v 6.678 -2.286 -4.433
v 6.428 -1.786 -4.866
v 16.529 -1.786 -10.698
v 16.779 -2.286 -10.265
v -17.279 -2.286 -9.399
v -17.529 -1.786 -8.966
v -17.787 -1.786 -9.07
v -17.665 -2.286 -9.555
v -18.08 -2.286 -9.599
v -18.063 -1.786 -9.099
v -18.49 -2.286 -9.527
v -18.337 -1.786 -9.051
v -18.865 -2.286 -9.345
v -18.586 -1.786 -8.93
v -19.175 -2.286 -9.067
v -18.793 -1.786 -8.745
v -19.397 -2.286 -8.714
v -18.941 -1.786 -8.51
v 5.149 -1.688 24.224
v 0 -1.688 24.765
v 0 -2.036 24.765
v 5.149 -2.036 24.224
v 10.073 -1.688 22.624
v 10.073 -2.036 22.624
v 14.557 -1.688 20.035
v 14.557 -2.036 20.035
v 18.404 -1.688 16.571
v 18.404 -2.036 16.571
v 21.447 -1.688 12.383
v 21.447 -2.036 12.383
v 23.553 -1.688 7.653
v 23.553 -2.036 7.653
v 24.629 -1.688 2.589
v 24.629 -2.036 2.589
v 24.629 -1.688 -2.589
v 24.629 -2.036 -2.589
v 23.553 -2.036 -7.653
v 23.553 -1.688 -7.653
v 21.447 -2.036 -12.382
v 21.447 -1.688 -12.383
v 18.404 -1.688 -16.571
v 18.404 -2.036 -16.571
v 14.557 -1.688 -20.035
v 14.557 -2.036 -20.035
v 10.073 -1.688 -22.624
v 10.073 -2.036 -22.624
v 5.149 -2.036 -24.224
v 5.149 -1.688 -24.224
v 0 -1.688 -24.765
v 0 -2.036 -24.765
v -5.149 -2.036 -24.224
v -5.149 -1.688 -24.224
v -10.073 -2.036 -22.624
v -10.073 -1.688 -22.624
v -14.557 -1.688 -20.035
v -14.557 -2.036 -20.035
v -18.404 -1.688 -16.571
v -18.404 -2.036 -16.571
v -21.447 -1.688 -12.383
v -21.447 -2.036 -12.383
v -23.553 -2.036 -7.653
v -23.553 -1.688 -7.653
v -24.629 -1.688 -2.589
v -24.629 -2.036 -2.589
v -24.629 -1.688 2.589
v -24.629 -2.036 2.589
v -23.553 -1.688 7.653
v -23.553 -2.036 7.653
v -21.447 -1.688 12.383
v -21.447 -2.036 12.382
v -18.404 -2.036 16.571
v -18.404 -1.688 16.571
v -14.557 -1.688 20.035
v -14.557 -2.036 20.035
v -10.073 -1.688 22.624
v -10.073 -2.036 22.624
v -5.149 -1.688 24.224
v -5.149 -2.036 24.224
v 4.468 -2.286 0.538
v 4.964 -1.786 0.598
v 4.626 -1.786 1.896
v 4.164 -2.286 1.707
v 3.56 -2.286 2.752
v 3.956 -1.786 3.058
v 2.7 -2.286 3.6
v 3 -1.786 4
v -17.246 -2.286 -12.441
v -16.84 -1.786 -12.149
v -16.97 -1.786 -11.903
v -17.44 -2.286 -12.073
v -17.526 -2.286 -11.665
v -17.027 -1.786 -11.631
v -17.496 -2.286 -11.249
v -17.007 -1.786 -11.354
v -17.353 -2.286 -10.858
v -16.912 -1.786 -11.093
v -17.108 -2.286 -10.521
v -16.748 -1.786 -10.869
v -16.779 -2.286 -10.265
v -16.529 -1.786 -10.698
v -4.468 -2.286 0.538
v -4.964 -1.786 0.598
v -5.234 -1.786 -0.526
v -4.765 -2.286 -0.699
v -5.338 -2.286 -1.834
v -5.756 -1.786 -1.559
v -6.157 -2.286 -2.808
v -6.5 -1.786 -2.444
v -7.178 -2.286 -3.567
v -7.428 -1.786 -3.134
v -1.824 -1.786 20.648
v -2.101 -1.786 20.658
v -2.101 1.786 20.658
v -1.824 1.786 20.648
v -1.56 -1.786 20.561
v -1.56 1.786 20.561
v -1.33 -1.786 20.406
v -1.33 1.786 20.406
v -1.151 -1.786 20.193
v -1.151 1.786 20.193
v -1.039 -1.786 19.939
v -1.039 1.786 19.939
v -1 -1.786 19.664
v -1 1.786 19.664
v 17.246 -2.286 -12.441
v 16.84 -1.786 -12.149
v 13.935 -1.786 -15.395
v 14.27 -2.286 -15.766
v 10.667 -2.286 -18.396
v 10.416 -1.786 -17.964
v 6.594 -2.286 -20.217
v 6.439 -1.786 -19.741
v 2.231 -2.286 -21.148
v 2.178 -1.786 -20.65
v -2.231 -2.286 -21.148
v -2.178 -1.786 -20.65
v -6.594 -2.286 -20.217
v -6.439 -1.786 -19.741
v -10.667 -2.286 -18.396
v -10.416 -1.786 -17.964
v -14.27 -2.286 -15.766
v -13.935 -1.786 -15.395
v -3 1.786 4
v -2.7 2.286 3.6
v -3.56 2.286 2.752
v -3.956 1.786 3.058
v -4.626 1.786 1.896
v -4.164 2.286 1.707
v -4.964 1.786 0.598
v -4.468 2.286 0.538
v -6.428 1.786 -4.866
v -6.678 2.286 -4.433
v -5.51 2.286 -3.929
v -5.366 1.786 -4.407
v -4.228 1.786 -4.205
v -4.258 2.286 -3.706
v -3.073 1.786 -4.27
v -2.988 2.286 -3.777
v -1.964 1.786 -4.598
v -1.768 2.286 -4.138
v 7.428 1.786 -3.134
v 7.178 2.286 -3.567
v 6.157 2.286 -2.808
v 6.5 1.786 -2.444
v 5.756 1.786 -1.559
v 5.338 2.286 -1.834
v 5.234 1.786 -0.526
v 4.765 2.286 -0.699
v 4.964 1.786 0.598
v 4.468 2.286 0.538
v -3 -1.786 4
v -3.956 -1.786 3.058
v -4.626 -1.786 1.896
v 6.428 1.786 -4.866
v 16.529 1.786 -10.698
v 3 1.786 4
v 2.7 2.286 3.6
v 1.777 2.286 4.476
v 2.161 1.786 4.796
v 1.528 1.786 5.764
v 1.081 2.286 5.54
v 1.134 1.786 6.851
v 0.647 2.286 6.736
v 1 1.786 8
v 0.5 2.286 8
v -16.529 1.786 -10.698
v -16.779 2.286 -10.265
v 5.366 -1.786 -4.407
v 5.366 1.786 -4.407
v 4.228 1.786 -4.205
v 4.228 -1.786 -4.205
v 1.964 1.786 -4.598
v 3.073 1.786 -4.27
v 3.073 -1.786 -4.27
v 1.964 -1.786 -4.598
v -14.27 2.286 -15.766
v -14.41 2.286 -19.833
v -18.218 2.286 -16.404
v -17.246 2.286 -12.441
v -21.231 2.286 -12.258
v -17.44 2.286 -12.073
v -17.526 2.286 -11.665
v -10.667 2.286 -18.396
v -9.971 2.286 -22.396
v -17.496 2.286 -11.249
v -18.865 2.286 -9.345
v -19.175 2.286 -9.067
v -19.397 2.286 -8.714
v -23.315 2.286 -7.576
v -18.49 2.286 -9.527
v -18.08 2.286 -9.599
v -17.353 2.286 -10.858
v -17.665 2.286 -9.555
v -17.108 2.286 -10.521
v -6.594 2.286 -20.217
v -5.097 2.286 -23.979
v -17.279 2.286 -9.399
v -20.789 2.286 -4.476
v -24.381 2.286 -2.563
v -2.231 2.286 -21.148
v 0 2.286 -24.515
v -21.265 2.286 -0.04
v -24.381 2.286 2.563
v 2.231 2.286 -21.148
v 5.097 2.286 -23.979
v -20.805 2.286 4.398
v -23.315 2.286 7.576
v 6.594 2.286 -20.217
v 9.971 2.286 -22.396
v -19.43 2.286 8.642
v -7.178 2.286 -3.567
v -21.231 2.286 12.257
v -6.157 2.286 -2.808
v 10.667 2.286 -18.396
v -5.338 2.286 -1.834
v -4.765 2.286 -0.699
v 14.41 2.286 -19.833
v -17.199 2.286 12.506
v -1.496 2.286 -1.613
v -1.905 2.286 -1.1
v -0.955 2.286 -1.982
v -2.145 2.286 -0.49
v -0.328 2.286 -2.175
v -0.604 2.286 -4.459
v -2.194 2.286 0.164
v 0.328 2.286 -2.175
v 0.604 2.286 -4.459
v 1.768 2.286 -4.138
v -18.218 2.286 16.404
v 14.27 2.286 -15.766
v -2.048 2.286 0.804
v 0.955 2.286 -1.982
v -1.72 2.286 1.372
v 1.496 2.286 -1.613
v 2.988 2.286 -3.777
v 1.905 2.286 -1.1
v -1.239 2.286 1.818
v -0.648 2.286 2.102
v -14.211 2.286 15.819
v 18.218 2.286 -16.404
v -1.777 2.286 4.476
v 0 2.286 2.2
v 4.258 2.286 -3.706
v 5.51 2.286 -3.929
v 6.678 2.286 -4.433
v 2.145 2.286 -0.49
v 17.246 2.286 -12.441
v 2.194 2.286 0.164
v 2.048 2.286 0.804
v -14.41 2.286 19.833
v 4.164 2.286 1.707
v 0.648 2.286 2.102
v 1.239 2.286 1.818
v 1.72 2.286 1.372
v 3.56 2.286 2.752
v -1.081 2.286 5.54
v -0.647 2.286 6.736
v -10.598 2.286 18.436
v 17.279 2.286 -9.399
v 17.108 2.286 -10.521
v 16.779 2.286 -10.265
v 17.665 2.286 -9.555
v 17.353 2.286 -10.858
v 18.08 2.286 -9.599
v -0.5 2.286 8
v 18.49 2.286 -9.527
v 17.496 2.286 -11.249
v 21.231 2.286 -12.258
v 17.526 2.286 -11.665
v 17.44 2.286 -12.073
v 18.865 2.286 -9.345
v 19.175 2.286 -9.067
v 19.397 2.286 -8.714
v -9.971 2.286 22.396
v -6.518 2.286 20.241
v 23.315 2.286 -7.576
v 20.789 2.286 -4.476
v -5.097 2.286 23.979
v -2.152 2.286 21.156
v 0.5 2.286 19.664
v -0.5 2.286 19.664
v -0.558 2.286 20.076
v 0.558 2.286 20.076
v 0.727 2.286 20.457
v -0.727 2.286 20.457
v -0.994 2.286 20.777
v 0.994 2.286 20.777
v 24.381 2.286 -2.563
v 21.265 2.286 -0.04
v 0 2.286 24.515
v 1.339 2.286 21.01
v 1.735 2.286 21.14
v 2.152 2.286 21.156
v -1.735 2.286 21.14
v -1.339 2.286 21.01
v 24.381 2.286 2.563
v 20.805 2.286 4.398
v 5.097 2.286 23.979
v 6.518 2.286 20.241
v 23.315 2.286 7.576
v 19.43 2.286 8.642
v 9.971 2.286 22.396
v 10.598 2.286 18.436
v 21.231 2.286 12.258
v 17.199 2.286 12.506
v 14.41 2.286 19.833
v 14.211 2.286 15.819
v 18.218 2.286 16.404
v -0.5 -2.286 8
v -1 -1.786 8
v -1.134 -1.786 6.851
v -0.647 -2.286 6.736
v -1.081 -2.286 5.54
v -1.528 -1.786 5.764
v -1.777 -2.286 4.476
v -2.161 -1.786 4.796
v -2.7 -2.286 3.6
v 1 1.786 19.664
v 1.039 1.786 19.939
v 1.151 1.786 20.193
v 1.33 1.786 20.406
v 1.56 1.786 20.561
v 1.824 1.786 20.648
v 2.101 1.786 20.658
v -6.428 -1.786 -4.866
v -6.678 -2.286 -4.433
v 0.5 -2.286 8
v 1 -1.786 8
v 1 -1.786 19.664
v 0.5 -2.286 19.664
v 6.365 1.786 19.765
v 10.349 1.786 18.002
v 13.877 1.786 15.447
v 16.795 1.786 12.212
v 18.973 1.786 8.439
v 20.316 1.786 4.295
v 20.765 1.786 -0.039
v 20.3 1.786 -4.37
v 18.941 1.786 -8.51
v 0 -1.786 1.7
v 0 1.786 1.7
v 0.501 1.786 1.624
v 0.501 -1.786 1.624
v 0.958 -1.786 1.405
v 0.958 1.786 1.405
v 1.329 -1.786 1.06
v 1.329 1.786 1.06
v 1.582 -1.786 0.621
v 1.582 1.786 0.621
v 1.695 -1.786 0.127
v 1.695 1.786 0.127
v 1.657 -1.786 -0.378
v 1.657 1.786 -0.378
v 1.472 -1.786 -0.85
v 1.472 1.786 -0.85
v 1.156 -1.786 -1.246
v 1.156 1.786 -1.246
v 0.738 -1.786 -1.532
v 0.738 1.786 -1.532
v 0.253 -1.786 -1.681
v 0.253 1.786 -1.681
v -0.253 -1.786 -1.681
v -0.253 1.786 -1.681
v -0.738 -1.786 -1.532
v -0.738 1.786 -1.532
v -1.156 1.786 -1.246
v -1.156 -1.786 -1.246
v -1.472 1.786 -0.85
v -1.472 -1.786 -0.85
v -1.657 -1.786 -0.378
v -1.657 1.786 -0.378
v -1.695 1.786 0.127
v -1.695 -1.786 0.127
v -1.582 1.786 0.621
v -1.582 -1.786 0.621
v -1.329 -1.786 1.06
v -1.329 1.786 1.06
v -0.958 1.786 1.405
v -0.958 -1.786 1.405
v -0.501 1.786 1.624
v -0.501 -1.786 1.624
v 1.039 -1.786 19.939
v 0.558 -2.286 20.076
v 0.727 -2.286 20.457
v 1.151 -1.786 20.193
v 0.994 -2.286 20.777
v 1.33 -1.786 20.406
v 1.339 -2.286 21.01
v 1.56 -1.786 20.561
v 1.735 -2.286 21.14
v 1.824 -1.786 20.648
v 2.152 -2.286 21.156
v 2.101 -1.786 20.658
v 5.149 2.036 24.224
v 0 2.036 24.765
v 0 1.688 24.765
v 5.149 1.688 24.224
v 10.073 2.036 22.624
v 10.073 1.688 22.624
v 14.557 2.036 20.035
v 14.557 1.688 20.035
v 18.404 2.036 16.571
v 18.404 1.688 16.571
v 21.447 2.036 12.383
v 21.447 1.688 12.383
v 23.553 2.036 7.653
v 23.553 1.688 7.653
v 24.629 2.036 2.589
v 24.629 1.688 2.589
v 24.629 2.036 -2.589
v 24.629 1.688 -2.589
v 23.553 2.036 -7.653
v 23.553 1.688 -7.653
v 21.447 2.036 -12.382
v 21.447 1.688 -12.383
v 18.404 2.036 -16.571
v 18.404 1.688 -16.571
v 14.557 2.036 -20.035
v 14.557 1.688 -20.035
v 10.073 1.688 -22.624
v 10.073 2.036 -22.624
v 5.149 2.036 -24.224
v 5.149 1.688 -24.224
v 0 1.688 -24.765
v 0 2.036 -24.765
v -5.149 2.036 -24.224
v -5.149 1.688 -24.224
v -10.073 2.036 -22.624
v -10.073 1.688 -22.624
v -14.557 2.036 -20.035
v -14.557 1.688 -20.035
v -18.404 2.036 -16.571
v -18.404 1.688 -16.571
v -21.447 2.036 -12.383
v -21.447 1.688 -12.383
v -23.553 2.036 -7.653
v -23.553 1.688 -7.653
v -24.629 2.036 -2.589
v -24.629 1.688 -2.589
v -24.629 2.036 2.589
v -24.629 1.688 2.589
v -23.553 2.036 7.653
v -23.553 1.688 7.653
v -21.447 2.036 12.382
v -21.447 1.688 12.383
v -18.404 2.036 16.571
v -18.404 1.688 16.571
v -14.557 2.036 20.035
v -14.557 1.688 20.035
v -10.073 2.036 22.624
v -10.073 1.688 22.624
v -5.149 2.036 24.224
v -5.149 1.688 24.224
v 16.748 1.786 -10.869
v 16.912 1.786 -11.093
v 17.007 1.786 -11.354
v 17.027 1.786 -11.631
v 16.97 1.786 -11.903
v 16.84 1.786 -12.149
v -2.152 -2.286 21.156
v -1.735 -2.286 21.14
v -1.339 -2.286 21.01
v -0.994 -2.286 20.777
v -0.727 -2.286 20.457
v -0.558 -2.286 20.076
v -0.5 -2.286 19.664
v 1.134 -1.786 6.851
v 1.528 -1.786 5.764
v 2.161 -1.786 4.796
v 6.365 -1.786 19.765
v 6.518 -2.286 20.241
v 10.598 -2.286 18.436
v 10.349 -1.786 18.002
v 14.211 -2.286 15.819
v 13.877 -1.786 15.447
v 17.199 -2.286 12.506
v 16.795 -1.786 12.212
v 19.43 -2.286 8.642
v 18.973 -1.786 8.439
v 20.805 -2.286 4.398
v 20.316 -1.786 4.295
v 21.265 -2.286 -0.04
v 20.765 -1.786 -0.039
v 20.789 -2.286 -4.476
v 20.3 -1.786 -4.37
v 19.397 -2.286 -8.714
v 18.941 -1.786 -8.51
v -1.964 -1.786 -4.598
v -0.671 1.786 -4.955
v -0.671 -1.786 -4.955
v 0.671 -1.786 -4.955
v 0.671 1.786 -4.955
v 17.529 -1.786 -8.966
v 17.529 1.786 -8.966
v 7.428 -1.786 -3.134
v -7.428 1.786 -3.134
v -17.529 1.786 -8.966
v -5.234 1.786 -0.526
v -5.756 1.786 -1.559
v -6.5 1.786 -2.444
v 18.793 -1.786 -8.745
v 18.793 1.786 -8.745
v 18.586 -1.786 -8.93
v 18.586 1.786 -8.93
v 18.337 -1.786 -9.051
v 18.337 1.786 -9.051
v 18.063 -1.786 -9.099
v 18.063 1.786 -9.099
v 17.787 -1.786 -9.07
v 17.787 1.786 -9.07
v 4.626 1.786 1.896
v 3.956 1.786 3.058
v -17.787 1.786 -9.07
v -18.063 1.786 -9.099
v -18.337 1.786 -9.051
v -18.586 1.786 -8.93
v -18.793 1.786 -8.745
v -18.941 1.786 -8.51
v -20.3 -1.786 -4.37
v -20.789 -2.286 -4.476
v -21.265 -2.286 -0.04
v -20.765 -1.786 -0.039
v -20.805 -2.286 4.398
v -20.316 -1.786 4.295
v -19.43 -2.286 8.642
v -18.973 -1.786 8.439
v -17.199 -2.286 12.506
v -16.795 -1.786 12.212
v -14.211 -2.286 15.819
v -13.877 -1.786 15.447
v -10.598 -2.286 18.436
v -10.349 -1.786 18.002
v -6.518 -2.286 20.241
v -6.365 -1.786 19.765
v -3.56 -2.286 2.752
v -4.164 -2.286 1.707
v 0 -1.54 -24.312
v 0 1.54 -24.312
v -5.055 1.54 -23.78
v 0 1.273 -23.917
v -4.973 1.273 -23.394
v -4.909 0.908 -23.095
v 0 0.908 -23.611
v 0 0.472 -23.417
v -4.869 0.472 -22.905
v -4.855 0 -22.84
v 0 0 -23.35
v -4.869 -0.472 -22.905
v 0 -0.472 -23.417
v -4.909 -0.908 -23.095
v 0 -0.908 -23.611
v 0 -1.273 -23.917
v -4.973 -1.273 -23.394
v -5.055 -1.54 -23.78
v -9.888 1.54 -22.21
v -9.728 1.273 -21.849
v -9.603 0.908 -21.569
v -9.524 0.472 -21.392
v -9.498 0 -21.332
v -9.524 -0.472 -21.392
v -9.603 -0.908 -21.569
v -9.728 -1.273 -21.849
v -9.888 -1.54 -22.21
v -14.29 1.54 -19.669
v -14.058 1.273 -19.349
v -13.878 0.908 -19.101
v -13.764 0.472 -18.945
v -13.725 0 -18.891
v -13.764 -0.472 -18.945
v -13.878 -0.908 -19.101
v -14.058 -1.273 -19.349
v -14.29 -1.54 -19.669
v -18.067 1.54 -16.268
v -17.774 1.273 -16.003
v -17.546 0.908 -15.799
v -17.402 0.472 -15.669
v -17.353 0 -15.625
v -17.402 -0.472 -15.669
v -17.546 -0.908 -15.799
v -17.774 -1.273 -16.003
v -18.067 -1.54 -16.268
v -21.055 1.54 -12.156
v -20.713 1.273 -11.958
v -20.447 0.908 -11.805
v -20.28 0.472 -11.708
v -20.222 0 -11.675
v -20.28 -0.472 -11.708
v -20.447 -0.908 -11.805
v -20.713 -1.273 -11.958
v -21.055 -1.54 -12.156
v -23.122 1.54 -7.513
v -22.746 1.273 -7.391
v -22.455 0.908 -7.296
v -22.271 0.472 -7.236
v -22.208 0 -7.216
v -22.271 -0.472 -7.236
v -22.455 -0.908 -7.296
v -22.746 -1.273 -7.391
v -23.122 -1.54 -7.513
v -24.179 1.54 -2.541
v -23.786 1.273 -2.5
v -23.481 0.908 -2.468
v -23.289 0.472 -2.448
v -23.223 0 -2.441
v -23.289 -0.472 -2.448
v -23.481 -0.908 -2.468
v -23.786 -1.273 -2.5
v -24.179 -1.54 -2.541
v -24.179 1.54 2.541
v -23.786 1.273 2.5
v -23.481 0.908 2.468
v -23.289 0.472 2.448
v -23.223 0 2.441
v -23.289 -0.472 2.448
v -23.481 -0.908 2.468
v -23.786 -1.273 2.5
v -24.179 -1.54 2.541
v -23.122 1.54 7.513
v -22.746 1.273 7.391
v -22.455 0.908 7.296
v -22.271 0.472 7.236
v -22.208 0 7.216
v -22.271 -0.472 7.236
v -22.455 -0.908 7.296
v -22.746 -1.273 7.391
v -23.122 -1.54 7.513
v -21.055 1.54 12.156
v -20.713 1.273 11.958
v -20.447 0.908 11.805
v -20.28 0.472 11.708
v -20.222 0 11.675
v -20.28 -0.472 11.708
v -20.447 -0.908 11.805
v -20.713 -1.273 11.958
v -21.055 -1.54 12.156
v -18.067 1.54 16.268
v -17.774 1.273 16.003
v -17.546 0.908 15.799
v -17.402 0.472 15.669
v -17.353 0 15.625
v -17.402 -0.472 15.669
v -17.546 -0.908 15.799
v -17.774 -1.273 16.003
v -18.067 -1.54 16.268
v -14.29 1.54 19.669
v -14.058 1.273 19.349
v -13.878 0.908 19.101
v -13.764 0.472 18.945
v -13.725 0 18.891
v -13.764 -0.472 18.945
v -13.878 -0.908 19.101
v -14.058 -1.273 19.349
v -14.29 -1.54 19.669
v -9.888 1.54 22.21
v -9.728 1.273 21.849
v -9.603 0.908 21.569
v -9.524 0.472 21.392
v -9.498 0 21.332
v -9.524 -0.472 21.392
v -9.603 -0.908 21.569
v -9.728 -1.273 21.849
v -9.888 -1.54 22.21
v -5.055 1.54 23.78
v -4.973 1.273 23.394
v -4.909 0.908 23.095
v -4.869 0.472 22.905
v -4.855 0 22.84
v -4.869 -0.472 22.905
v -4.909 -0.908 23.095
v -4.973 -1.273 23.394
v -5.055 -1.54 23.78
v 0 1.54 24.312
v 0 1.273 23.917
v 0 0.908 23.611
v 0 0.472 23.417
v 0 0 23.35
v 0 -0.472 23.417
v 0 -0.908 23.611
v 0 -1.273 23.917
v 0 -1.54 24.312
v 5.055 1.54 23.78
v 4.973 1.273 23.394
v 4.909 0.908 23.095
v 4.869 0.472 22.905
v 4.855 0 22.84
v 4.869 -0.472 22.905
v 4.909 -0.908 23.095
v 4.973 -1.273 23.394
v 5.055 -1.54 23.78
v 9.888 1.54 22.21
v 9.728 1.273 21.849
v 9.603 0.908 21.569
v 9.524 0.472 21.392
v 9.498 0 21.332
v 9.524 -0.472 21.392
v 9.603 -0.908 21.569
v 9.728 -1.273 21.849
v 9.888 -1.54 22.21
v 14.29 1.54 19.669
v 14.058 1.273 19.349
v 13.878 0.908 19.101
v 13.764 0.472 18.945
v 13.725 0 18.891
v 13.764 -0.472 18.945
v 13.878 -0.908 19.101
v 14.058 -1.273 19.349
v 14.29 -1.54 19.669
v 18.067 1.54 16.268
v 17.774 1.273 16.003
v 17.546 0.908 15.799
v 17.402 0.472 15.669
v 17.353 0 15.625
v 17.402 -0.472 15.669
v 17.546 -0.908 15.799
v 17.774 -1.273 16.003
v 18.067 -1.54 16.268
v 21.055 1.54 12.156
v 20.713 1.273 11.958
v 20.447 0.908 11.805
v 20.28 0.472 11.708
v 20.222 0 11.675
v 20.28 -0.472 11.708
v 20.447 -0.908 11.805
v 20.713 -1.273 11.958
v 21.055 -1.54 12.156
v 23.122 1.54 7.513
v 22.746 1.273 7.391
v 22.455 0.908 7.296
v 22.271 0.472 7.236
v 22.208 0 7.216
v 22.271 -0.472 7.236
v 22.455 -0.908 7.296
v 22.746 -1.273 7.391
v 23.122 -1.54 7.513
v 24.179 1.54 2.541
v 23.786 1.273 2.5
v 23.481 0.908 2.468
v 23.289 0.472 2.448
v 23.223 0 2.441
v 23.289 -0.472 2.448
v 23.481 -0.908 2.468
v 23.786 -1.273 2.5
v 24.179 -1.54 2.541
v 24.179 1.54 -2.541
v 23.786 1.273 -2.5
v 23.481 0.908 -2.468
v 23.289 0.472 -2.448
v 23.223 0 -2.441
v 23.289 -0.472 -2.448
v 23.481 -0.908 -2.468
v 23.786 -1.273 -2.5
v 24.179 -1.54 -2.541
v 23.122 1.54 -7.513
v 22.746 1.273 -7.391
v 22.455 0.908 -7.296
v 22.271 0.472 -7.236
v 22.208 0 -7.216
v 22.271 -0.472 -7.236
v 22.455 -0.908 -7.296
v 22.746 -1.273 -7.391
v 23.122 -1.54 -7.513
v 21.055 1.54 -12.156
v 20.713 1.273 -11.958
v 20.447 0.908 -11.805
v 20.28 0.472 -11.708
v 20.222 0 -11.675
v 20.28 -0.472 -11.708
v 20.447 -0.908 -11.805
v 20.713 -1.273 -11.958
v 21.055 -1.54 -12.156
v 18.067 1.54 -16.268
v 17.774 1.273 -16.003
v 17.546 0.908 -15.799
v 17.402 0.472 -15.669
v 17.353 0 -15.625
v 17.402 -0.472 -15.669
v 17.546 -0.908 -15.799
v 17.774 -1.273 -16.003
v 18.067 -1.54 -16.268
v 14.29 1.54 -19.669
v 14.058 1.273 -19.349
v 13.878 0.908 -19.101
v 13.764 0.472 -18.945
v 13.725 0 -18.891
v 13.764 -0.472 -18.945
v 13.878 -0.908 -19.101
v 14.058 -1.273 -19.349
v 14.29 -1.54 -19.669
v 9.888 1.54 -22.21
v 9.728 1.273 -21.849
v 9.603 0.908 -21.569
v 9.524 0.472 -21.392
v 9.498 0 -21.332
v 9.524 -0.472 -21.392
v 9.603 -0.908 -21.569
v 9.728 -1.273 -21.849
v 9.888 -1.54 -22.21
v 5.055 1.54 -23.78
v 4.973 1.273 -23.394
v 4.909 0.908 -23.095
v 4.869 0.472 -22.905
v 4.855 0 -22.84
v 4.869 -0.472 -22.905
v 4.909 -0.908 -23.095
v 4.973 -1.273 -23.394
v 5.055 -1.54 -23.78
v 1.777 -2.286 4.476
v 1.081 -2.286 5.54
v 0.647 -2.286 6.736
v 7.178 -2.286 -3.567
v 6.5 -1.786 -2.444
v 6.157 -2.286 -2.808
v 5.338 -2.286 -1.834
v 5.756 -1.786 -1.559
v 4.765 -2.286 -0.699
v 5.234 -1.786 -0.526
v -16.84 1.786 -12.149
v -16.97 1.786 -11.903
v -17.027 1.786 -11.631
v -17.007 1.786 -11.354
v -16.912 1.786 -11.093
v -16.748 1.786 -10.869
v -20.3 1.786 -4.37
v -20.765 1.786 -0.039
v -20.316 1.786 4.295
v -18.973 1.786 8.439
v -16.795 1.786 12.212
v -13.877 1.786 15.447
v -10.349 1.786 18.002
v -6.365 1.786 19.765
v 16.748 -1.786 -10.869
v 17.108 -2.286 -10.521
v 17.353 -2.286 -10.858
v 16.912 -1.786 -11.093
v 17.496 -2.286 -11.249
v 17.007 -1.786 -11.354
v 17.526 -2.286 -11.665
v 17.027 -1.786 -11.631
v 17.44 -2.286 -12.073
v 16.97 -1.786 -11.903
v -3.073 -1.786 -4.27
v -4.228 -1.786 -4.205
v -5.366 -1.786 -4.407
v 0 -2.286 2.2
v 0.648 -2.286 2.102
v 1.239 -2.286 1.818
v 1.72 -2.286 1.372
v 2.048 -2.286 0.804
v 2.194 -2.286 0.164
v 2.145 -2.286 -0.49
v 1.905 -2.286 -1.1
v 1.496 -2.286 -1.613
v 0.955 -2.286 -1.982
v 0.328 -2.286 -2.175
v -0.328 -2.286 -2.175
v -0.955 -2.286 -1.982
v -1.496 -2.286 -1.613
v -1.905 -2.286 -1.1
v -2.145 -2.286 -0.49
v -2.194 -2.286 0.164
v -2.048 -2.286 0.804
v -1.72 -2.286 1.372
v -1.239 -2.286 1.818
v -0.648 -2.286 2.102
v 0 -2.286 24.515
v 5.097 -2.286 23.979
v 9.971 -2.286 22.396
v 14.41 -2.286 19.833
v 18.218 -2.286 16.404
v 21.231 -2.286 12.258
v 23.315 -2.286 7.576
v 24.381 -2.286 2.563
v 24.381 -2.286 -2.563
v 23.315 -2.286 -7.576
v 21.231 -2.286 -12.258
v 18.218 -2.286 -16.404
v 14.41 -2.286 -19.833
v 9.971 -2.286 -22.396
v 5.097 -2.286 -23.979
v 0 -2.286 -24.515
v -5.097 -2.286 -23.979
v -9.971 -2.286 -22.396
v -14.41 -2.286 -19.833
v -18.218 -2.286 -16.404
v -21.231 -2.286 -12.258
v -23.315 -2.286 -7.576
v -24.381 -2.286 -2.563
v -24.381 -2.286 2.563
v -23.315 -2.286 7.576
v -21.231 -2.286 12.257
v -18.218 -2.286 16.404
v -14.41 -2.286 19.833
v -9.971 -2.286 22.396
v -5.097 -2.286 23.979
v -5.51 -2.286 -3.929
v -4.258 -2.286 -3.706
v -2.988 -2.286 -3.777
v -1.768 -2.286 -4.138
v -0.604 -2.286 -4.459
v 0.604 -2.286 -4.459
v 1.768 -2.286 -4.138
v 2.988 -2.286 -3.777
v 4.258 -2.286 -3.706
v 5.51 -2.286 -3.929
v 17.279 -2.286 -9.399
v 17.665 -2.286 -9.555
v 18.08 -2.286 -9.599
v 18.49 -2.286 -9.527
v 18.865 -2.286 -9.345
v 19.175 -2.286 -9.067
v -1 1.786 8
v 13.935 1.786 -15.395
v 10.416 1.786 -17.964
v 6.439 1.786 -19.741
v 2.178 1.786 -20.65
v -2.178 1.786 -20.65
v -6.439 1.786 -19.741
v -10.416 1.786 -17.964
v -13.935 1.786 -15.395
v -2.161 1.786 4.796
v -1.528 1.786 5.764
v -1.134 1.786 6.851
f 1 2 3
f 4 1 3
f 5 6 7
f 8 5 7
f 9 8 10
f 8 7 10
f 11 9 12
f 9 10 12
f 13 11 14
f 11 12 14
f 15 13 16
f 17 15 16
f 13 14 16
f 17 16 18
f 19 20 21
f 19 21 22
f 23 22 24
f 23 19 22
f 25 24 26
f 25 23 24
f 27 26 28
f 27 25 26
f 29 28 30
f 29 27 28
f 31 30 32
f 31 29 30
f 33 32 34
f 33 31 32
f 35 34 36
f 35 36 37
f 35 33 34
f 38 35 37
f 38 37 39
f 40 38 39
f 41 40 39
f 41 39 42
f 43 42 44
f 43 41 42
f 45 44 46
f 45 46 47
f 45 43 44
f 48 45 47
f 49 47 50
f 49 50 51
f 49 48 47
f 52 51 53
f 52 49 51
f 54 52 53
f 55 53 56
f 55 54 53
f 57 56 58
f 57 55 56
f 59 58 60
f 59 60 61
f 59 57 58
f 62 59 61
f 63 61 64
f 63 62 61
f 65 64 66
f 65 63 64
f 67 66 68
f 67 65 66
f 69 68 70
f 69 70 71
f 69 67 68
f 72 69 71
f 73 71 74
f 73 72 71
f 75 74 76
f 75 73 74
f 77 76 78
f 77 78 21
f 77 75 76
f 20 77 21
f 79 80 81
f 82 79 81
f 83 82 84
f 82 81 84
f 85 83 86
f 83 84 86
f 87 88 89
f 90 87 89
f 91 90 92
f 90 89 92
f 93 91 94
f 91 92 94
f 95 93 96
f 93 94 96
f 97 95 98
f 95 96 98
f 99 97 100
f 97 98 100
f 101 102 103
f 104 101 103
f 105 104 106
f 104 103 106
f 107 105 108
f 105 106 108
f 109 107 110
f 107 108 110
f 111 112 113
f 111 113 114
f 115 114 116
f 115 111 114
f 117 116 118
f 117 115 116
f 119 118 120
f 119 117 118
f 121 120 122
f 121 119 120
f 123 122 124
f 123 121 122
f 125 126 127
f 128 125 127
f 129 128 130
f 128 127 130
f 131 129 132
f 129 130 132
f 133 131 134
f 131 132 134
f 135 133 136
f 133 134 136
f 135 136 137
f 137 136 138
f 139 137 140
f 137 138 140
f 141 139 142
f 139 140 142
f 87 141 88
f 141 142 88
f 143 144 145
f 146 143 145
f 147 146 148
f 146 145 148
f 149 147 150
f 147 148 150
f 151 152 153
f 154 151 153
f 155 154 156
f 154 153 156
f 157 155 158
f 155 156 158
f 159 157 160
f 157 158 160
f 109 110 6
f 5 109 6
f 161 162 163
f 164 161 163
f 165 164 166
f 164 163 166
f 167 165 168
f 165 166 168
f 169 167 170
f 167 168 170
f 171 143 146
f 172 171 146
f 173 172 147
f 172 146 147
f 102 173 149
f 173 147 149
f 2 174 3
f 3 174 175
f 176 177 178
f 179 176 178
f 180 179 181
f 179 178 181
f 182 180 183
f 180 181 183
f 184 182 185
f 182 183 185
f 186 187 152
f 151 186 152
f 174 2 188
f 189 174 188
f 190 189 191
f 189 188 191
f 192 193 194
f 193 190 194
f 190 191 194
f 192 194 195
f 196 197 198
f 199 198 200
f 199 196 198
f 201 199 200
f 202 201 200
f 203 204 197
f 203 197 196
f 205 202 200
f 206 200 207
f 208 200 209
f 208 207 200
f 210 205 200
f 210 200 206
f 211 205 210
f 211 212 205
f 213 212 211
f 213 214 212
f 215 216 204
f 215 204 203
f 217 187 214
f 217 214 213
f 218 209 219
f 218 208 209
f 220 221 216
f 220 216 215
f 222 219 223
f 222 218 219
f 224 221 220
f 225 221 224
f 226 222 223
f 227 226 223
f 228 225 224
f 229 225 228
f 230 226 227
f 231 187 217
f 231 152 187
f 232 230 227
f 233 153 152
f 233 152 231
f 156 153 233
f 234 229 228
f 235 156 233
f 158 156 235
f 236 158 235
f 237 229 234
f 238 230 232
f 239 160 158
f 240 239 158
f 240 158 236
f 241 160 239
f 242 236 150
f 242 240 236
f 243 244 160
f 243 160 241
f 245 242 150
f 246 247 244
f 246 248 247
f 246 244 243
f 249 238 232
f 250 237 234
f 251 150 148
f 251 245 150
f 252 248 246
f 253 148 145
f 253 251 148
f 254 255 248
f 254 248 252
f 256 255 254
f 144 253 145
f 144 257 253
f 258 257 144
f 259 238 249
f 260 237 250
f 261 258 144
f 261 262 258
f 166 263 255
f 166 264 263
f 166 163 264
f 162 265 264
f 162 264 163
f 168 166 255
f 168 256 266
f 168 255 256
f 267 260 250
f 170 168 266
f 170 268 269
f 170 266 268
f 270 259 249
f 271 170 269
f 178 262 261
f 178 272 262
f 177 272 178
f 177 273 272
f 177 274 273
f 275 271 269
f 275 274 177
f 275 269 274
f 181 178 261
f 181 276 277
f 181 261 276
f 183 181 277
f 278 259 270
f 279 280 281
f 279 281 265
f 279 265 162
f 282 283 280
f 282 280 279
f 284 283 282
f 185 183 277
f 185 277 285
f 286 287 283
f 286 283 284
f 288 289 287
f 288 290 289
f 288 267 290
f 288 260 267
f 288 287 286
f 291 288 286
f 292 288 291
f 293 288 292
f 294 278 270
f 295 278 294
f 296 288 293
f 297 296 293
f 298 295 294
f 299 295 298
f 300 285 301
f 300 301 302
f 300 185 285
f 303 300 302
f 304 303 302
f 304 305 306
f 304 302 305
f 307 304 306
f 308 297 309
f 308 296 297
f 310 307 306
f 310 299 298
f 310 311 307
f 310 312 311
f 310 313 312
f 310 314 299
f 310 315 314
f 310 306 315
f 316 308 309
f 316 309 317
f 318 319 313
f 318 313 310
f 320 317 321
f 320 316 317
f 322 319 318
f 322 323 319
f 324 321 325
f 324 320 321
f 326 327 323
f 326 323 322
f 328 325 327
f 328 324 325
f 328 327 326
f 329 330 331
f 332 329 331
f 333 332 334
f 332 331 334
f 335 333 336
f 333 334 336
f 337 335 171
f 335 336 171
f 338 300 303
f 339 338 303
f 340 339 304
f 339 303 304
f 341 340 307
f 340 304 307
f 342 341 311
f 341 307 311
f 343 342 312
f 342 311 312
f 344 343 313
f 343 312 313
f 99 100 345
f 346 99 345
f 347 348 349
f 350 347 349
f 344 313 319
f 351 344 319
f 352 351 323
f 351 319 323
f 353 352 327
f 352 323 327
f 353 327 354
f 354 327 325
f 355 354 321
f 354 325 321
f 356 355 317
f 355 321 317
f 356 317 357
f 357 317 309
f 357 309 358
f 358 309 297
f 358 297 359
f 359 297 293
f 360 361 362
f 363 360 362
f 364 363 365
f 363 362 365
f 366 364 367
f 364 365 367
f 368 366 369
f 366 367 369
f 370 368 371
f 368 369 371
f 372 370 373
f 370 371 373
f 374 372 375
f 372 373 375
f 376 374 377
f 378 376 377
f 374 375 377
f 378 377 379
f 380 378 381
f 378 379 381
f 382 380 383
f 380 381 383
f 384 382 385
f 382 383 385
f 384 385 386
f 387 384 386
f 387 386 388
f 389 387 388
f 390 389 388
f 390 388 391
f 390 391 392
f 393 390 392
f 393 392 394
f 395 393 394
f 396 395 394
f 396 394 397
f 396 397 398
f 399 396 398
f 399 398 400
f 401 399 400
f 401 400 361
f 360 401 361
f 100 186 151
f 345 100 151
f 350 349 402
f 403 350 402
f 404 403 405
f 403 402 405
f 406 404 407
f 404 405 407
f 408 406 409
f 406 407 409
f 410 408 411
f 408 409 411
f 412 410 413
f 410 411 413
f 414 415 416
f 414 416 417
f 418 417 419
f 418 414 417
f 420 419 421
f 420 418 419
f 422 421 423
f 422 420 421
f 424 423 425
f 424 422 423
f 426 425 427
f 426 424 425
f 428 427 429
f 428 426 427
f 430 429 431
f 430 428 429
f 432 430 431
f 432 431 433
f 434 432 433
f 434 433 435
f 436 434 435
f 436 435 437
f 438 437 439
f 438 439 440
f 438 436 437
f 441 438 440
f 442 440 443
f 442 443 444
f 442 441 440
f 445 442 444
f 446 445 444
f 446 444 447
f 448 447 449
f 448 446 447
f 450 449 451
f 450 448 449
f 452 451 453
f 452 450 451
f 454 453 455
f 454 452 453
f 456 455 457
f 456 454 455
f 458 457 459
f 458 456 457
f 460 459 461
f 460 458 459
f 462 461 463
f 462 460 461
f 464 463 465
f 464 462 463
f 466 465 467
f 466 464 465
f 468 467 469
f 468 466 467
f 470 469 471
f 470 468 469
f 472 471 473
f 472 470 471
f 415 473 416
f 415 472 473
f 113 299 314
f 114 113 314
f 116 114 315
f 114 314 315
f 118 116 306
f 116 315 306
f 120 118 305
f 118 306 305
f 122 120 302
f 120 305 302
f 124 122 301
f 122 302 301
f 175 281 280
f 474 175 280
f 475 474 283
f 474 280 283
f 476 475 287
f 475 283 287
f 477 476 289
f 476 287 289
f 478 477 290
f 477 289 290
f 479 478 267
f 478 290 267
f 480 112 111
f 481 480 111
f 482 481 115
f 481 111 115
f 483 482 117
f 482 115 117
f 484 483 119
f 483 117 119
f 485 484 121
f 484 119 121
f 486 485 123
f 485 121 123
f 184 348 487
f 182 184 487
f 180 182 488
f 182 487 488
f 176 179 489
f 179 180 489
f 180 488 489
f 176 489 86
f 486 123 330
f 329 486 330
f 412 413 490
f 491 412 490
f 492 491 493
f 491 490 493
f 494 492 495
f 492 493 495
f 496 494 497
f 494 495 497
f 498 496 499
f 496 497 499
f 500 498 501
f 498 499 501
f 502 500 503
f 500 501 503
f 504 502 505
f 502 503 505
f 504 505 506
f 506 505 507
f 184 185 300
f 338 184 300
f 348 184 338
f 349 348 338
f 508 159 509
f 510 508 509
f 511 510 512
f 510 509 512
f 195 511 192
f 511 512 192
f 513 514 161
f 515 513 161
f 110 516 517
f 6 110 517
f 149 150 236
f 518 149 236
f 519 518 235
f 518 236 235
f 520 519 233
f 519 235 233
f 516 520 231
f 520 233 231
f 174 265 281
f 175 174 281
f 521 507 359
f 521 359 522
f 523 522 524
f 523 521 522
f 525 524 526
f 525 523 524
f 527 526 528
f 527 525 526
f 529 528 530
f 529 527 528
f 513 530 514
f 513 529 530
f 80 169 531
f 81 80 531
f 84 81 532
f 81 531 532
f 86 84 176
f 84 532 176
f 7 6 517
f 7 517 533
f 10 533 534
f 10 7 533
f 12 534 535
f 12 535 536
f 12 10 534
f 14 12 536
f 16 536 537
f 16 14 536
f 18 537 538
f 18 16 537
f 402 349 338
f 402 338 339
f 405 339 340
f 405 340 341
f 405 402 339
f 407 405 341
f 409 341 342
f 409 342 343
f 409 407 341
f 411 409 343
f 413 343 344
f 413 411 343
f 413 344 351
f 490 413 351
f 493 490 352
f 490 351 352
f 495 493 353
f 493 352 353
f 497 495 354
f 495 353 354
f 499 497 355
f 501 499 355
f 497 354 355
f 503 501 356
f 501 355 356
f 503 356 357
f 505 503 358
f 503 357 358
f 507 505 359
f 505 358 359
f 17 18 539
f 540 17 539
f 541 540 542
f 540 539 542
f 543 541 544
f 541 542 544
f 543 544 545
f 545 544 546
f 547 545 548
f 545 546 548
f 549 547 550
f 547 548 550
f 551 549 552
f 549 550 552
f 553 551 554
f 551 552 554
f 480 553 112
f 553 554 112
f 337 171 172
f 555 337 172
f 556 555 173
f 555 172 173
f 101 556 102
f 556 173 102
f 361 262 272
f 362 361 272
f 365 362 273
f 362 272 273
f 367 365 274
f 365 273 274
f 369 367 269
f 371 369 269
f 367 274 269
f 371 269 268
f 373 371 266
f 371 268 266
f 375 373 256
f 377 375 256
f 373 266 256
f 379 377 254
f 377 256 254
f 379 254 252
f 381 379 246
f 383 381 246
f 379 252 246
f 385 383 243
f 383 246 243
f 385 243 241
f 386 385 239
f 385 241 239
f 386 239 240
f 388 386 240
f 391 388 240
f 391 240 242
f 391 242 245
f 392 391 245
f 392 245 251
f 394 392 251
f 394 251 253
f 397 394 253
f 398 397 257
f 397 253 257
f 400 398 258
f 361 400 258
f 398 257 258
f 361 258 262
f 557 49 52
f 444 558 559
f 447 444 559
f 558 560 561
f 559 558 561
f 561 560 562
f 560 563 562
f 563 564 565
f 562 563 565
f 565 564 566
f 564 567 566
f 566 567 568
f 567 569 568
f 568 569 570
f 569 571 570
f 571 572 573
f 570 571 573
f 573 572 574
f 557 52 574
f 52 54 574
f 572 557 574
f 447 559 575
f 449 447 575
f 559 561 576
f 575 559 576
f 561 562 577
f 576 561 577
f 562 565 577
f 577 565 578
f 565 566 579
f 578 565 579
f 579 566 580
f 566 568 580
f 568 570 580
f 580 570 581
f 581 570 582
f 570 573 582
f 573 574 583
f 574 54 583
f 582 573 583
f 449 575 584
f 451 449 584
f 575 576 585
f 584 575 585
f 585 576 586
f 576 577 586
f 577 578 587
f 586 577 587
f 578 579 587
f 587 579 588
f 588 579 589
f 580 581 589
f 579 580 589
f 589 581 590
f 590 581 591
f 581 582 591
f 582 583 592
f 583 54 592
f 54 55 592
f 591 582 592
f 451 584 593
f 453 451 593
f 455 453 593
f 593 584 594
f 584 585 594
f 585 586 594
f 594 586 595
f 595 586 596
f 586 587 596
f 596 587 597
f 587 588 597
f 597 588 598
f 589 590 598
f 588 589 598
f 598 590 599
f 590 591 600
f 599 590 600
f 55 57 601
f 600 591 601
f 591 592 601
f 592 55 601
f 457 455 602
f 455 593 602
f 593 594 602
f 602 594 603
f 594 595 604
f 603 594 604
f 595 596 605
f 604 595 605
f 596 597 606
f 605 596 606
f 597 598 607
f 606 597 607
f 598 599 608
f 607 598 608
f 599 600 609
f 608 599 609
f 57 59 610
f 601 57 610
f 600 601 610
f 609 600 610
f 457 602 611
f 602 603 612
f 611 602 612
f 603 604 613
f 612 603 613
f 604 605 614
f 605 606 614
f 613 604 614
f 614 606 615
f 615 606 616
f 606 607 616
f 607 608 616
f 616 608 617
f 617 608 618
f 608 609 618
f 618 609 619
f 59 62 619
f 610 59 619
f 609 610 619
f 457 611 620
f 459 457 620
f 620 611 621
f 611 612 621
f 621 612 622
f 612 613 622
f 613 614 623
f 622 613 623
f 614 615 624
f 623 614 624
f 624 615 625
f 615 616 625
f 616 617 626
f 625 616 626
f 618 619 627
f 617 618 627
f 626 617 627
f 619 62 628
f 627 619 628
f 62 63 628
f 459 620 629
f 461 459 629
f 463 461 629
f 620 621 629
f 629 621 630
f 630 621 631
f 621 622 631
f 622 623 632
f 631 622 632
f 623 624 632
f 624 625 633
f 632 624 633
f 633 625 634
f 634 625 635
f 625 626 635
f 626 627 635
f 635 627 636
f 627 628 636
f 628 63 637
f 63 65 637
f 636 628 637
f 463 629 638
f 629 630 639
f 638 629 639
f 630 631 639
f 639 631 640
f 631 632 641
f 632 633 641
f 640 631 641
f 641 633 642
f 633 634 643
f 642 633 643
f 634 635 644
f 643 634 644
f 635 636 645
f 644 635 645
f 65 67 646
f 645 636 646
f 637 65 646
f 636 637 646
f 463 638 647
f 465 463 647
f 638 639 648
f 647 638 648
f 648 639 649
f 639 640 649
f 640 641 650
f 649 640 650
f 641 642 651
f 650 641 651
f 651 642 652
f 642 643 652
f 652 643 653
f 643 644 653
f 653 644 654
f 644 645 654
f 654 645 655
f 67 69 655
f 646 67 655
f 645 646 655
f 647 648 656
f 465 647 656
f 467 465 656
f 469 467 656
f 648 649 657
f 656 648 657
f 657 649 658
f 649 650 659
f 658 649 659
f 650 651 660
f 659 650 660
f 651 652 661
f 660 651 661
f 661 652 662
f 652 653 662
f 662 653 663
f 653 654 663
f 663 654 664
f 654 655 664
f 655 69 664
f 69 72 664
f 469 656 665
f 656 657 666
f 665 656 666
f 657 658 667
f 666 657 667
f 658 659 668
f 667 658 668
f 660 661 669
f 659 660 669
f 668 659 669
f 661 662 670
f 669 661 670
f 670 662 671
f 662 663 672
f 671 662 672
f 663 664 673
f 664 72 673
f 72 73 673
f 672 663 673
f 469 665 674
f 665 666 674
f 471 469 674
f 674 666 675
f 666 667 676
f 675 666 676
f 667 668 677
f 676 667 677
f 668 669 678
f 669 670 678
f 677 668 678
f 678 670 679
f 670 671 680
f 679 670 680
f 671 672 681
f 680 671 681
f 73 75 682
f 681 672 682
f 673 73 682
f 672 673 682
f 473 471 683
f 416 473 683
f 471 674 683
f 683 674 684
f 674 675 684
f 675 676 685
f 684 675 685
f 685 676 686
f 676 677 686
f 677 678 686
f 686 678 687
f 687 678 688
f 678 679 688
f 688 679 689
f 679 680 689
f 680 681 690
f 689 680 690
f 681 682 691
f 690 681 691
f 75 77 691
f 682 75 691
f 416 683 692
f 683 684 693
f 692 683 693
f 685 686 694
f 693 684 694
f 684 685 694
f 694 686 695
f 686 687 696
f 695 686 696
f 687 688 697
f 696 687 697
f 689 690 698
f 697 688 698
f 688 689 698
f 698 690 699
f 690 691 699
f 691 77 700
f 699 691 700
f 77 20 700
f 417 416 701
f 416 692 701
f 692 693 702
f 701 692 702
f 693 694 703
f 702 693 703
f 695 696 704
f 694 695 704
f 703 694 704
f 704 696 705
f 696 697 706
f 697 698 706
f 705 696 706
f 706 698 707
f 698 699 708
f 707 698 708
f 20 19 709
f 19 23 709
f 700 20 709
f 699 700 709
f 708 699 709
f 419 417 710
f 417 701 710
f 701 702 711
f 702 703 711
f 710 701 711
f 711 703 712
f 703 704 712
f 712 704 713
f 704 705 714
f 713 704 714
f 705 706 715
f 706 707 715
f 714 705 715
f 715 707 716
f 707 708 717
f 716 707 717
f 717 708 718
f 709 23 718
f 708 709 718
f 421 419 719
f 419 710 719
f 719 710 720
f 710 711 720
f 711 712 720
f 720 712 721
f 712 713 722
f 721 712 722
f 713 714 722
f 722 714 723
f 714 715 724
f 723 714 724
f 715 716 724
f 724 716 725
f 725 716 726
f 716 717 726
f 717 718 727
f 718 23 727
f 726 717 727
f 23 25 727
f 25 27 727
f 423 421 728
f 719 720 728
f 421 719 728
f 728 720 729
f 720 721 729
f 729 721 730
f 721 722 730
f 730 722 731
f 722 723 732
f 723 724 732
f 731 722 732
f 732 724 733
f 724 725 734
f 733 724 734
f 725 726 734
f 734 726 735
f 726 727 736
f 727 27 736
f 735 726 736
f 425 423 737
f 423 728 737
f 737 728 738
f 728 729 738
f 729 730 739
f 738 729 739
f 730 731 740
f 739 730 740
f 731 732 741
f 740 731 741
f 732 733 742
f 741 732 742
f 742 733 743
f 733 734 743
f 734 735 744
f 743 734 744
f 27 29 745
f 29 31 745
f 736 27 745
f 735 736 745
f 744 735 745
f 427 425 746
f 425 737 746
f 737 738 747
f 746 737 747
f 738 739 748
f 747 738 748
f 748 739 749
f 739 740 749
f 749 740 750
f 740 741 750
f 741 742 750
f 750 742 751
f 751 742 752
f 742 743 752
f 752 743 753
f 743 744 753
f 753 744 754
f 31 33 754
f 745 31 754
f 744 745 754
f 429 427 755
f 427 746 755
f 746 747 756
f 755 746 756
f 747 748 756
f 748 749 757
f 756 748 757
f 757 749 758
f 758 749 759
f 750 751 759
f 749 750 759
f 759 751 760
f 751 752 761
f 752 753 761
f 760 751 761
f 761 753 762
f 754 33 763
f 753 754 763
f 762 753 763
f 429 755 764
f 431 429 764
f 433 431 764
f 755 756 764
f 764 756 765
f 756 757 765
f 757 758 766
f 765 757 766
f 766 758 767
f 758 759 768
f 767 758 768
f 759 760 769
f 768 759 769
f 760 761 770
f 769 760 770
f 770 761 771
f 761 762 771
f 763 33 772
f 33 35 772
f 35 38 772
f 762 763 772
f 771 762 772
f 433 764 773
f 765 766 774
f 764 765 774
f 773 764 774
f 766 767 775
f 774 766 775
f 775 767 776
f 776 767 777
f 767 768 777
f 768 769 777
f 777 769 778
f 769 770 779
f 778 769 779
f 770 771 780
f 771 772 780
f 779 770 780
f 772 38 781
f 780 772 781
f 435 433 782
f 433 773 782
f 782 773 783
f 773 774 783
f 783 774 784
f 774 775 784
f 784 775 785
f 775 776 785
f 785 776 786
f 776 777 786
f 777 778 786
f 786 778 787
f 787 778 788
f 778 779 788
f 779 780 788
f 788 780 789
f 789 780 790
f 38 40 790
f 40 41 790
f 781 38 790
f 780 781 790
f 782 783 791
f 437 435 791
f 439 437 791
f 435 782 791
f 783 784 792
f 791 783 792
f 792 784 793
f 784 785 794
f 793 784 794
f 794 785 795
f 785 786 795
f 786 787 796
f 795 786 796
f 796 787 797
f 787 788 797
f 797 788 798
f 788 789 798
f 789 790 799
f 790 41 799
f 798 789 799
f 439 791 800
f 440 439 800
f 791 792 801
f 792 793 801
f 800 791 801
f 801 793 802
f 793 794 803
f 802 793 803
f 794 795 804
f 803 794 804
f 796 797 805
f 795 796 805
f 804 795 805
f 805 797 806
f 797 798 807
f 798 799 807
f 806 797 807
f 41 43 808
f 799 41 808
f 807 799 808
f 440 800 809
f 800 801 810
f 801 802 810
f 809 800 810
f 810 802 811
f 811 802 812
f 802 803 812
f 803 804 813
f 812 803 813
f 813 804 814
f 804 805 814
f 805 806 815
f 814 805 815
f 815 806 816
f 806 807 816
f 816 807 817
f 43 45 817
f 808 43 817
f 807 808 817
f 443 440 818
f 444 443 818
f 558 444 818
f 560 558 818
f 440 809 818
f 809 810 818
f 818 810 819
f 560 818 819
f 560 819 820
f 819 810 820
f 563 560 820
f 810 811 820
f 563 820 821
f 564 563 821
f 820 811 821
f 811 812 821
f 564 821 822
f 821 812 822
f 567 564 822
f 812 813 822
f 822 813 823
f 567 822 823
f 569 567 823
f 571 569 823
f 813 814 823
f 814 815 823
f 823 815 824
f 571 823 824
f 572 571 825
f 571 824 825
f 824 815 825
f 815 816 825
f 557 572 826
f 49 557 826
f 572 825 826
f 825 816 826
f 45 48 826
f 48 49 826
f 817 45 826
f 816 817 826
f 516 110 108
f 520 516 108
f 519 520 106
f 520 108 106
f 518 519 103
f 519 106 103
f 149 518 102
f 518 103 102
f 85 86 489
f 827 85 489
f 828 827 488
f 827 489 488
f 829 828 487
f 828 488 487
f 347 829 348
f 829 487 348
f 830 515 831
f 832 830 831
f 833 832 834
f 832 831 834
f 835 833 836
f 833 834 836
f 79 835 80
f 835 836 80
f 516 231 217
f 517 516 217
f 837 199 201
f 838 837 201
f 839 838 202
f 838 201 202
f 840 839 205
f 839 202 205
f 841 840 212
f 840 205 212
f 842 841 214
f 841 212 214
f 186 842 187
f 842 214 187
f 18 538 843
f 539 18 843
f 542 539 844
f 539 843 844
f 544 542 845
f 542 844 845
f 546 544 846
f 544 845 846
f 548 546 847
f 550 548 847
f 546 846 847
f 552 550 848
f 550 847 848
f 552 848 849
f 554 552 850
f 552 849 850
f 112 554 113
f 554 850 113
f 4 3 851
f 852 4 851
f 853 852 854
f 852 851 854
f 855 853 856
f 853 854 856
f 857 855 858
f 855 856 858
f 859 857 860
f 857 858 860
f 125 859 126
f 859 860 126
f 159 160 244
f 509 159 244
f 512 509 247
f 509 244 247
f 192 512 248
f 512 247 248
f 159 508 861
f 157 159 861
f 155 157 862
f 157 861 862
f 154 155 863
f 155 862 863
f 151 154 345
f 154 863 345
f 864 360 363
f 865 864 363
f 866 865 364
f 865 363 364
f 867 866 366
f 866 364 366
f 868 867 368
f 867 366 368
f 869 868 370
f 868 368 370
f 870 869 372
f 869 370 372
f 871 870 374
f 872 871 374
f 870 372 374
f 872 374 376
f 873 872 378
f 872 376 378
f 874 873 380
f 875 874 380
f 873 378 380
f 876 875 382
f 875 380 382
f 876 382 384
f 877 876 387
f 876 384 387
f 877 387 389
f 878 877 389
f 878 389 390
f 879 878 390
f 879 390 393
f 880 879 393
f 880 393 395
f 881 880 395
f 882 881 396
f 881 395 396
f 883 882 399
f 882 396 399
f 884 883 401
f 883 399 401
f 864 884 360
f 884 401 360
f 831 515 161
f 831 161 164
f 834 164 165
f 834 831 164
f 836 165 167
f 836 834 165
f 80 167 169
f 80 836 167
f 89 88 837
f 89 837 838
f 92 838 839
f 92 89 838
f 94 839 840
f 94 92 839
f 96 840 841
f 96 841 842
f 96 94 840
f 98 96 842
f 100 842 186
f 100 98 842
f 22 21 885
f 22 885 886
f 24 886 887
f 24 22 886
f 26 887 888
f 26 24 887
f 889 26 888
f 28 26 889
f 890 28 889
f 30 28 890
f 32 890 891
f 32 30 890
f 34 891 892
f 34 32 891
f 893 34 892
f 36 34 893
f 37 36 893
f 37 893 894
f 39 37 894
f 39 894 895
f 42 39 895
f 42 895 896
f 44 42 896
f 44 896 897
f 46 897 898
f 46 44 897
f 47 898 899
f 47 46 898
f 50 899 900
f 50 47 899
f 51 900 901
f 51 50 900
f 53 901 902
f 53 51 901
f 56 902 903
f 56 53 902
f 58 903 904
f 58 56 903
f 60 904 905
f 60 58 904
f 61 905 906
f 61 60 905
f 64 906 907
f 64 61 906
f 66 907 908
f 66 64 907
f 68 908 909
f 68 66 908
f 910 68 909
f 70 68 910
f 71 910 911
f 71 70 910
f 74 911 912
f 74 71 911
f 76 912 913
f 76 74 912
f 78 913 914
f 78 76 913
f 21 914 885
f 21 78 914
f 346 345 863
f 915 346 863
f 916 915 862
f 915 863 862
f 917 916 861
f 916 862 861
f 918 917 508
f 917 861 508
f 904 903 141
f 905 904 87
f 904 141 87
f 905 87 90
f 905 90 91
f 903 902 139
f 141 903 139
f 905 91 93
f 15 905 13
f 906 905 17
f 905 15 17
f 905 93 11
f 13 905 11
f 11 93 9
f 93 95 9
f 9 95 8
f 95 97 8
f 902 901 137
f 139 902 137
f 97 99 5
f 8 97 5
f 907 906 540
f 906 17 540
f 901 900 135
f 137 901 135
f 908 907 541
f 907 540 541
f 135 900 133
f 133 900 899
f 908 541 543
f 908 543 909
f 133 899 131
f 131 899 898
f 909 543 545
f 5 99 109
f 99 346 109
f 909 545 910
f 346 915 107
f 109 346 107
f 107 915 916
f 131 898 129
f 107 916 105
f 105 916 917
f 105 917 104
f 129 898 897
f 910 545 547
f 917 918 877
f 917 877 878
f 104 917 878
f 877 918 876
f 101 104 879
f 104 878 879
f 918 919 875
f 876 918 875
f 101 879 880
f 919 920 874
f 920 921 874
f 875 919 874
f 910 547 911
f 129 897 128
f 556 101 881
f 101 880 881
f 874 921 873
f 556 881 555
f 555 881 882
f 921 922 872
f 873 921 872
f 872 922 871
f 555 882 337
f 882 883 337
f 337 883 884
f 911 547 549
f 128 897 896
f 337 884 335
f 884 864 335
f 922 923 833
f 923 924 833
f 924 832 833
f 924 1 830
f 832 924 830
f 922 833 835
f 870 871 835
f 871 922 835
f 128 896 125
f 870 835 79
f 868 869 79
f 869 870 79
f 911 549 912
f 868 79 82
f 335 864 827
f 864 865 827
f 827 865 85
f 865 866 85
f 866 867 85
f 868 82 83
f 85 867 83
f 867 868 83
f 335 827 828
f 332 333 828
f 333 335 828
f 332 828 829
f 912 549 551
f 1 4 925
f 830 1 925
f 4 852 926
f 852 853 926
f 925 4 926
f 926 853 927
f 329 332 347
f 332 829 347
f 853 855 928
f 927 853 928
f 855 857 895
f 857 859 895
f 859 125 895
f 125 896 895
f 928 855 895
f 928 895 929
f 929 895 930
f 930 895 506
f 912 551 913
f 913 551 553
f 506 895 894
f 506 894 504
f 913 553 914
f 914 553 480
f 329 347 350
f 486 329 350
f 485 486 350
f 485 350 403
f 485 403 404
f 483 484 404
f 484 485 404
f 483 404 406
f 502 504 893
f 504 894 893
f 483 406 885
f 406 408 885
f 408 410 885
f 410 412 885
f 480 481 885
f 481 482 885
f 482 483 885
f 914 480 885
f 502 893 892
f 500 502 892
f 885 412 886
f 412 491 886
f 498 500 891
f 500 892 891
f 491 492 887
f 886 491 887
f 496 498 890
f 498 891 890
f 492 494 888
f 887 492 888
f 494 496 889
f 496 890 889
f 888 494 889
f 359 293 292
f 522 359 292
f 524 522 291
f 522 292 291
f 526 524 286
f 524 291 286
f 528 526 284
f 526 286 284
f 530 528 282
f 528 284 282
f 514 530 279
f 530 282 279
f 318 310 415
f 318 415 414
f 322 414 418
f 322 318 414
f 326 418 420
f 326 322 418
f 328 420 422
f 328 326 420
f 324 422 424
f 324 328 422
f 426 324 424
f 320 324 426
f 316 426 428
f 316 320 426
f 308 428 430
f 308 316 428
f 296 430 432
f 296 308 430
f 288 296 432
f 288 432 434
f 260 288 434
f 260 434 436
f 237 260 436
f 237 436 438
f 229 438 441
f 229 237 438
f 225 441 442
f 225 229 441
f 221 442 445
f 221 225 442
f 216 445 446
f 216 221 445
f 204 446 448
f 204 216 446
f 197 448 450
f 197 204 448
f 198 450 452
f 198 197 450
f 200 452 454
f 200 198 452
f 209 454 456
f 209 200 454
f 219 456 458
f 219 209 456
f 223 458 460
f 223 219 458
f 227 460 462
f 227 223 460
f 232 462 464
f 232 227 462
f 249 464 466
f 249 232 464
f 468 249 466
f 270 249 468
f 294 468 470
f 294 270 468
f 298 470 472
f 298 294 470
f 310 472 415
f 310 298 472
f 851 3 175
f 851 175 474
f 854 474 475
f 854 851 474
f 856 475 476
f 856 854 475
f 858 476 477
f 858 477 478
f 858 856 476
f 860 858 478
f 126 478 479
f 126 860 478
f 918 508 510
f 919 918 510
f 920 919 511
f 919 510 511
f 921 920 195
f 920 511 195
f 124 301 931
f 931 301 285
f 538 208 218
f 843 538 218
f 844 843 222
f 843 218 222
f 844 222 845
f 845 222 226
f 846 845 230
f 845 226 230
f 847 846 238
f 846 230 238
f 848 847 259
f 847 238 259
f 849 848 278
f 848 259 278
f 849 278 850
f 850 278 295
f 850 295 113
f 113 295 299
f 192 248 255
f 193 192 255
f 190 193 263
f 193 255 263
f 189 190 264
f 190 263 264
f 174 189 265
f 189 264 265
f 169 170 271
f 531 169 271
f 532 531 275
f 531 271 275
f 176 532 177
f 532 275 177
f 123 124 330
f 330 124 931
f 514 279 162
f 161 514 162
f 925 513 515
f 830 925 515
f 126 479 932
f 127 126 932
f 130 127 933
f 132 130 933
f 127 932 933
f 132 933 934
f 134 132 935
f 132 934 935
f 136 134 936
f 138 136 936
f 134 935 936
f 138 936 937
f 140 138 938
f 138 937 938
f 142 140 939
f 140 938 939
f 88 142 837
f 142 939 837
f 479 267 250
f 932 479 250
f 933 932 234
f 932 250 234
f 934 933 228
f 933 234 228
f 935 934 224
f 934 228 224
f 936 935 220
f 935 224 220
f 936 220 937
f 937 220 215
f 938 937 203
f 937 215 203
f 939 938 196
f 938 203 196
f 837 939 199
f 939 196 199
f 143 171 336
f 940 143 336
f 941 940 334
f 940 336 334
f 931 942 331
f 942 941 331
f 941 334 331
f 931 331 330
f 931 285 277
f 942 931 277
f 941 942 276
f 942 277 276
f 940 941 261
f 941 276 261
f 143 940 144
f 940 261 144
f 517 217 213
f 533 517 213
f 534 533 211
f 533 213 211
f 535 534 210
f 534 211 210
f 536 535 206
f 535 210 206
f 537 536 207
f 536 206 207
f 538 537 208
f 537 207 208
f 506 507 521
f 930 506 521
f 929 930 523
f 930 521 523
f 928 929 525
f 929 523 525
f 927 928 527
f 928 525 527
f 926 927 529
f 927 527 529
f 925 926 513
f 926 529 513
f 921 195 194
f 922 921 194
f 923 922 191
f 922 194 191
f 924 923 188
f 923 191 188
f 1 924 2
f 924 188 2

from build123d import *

# Parameters (mm, degrees)
SKETCH1_R           = 24.765
BOSS_EXTRUDE1_DEPTH = 2.286
SKETCH2_R           = 1.7145
SKETCH3_R           = 1.7
CUT_EXTRUDE1_DEPTH  = 36.320159031
CUT_EXTRUDE2_DEPTH  = 36.320159031
CIRPATTERN1_COUNT   = 3
FILLET1_R           = 5
FILLET4_R           = 1
CHAMFER1_SIZE       = 0.5
CHAMFER2_SIZE       = 0.5
CHAMFER3_SIZE       = 0.25


with BuildPart() as part:
    # Sketch1 → Boss-Extrude1 (new, symmetric)
    with BuildSketch(Plane(origin=(0, 0, 0), x_dir=(1, 0, 0), z_dir=(0, 1, 0))):
        with Locations(Location((0, 0, 0), (0, 0, 270))):
            Circle(SKETCH1_R)
    extrude(amount=BOSS_EXTRUDE1_DEPTH, both=True)

    # Sketch2 → Cut-Revolve1 (revolve, cut)
    with BuildSketch(Plane(origin=(0, 0, 0), x_dir=(0, 0, -1), z_dir=(1, 0, 0))):
        with Locations((25.065, 0)):
            Circle(SKETCH2_R)
    revolve(axis=Axis((0, 0, 0), (0, 1, 0)), mode=Mode.SUBTRACT)

    # Sketch3 → Cut-Extrude1 (cut, through all)
    with BuildSketch(Plane(origin=(0, 2.286, 0), x_dir=(1, 0, 0), z_dir=(0, 1, 0))):
        with Locations(Location((0, 0, 0), (0, 0, 270))):
            Circle(SKETCH3_R)
    extrude(amount=-CUT_EXTRUDE1_DEPTH, mode=Mode.SUBTRACT)

    # Sketch4 → Cut-Extrude2 (cut, through all)
    with BuildSketch(Plane(origin=(0, 2.286, 0), x_dir=(1, 0, 0), z_dir=(0, 1, 0))):
        with BuildLine():
            Line((3.742640687, 3.315515147), (17.462152397, 11.236478926))
            ThreePointArc((17.462152397, 11.236478926), (0, 20.765), (-17.462152397, 11.236478926))
            Line((-17.462152397, 11.236478926), (-3.742640687, 3.315515147))
            ThreePointArc((-3.742640687, 3.315515147), (0, 5), (3.742640687, 3.315515147))
        make_face()
    cut_extrude2 = extrude(amount=-CUT_EXTRUDE2_DEPTH, mode=Mode.SUBTRACT)

    # CirPattern1: Cut-Extrude2 ×3 about axis
    cirpattern1_axis = Axis((0, 0, 0), (0, 1, 0))
    for i in range(1, CIRPATTERN1_COUNT):
        add(cut_extrude2.rotate(cirpattern1_axis, i * 360 / CIRPATTERN1_COUNT), mode=Mode.SUBTRACT)

    # Fillet1
    fillet1_edges = [part.edges().sort_by_distance(p)[0] for p in [
        (3.742640687, 0, -3.315515147),
        (-3.742640687, 0, -3.315515147),
        (1, 0, 4.898979486),
        (4.742640687, 0, -1.583464339),
        (-4.742640687, 0, -1.583464339),
        (-1, 0, 4.898979486),
    ]]
    fillet(fillet1_edges, radius=FILLET1_R)

    # Fillet4
    fillet4_edges = [part.edges().sort_by_distance(p)[0] for p in [
        (-17.462152397, 0, -11.236478926),
        (17.462152397, 0, -11.236478926),
        (18.462152397, 0, -9.504428118),
        (1, 0, 20.740907044),
        (-1, 0, 20.740907044),
        (-18.462152397, 0, -9.504428118),
    ]]
    fillet(fillet4_edges, radius=FILLET4_R)

    # Chamfer1
    chamfer1_edges = [part.edges().sort_by_distance(p)[0] for p in [
        (0, -2.286, -1.7),
        (0, 2.286, -1.7),
    ]]
    chamfer(chamfer1_edges, length=CHAMFER1_SIZE)

    # Chamfer2
    chamfer2_edges = [part.edges().sort_by_distance(p)[0] for p in [
        (-17.98301751, 2.286, 10.3825),
        (-17.98301751, -2.286, 10.3825),
        (-11.47866882, 2.286, -7.781913072),
        (-11.47866882, -2.286, -7.781913072),
        (-1, 2.286, 13.831775336),
        (-1, -2.286, 13.831775336),
        (17.006931622, 2.286, -11.354272778),
        (17.006931622, -2.286, -11.354272778),
        (18.336554478, 2.286, -9.051298436),
        (18.336554478, -2.286, -9.051298436),
        (-18.336554478, 2.286, -9.051298436),
        (-18.336554478, -2.286, -9.051298436),
        (-17.006931622, 2.286, -11.354272778),
        (-17.006931622, -2.286, -11.354272778),
        (1.329622856, 2.286, 20.405571214),
        (1.329622856, -2.286, 20.405571214),
        (-1.329622856, 2.286, 20.405571214),
        (-1.329622856, -2.286, 20.405571214),
        (11.47866882, 2.286, -7.781913072),
        (11.47866882, -2.286, -7.781913072),
        (0, 2.286, -5),
        (0, -2.286, -5),
        (4.330127019, 2.286, 2.5),
        (4.330127019, -2.286, 2.5),
        (1, 2.286, 13.831775336),
        (1, -2.286, 13.831775336),
        (-4.330127019, 2.286, 2.5),
        (-4.330127019, -2.286, 2.5),
        (-12.47866882, 2.286, -6.049862264),
        (-12.47866882, -2.286, -6.049862264),
        (4.227779535, 2.286, -4.205135088),
        (4.227779535, -2.286, -4.205135088),
        (-4.227779535, 2.286, -4.205135088),
        (-4.227779535, -2.286, -4.205135088),
        (5.75564358, 2.286, -1.558796935),
        (5.75564358, -2.286, -1.558796935),
        (1.527864045, 2.286, 5.763932023),
        (1.527864045, -2.286, 5.763932023),
        (-1.527864045, 2.286, 5.763932023),
        (-1.527864045, -2.286, 5.763932023),
        (-5.75564358, 2.286, -1.558796935),
        (-5.75564358, -2.286, -1.558796935),
        (0, 2.286, -20.765),
        (0, -2.286, -20.765),
        (12.47866882, 2.286, -6.049862264),
        (12.47866882, -2.286, -6.049862264),
        (17.98301751, 2.286, 10.3825),
        (17.98301751, -2.286, 10.3825),
    ]]
    chamfer(chamfer2_edges, length=CHAMFER2_SIZE)

    # Chamfer3
    chamfer3_edges = [part.edges().sort_by_distance(p)[0] for p in [
        (0, -2.286, -24.765),
        (0, 2.286, -24.765),
    ]]
    chamfer(chamfer3_edges, length=CHAMFER3_SIZE)


solid = part.part
